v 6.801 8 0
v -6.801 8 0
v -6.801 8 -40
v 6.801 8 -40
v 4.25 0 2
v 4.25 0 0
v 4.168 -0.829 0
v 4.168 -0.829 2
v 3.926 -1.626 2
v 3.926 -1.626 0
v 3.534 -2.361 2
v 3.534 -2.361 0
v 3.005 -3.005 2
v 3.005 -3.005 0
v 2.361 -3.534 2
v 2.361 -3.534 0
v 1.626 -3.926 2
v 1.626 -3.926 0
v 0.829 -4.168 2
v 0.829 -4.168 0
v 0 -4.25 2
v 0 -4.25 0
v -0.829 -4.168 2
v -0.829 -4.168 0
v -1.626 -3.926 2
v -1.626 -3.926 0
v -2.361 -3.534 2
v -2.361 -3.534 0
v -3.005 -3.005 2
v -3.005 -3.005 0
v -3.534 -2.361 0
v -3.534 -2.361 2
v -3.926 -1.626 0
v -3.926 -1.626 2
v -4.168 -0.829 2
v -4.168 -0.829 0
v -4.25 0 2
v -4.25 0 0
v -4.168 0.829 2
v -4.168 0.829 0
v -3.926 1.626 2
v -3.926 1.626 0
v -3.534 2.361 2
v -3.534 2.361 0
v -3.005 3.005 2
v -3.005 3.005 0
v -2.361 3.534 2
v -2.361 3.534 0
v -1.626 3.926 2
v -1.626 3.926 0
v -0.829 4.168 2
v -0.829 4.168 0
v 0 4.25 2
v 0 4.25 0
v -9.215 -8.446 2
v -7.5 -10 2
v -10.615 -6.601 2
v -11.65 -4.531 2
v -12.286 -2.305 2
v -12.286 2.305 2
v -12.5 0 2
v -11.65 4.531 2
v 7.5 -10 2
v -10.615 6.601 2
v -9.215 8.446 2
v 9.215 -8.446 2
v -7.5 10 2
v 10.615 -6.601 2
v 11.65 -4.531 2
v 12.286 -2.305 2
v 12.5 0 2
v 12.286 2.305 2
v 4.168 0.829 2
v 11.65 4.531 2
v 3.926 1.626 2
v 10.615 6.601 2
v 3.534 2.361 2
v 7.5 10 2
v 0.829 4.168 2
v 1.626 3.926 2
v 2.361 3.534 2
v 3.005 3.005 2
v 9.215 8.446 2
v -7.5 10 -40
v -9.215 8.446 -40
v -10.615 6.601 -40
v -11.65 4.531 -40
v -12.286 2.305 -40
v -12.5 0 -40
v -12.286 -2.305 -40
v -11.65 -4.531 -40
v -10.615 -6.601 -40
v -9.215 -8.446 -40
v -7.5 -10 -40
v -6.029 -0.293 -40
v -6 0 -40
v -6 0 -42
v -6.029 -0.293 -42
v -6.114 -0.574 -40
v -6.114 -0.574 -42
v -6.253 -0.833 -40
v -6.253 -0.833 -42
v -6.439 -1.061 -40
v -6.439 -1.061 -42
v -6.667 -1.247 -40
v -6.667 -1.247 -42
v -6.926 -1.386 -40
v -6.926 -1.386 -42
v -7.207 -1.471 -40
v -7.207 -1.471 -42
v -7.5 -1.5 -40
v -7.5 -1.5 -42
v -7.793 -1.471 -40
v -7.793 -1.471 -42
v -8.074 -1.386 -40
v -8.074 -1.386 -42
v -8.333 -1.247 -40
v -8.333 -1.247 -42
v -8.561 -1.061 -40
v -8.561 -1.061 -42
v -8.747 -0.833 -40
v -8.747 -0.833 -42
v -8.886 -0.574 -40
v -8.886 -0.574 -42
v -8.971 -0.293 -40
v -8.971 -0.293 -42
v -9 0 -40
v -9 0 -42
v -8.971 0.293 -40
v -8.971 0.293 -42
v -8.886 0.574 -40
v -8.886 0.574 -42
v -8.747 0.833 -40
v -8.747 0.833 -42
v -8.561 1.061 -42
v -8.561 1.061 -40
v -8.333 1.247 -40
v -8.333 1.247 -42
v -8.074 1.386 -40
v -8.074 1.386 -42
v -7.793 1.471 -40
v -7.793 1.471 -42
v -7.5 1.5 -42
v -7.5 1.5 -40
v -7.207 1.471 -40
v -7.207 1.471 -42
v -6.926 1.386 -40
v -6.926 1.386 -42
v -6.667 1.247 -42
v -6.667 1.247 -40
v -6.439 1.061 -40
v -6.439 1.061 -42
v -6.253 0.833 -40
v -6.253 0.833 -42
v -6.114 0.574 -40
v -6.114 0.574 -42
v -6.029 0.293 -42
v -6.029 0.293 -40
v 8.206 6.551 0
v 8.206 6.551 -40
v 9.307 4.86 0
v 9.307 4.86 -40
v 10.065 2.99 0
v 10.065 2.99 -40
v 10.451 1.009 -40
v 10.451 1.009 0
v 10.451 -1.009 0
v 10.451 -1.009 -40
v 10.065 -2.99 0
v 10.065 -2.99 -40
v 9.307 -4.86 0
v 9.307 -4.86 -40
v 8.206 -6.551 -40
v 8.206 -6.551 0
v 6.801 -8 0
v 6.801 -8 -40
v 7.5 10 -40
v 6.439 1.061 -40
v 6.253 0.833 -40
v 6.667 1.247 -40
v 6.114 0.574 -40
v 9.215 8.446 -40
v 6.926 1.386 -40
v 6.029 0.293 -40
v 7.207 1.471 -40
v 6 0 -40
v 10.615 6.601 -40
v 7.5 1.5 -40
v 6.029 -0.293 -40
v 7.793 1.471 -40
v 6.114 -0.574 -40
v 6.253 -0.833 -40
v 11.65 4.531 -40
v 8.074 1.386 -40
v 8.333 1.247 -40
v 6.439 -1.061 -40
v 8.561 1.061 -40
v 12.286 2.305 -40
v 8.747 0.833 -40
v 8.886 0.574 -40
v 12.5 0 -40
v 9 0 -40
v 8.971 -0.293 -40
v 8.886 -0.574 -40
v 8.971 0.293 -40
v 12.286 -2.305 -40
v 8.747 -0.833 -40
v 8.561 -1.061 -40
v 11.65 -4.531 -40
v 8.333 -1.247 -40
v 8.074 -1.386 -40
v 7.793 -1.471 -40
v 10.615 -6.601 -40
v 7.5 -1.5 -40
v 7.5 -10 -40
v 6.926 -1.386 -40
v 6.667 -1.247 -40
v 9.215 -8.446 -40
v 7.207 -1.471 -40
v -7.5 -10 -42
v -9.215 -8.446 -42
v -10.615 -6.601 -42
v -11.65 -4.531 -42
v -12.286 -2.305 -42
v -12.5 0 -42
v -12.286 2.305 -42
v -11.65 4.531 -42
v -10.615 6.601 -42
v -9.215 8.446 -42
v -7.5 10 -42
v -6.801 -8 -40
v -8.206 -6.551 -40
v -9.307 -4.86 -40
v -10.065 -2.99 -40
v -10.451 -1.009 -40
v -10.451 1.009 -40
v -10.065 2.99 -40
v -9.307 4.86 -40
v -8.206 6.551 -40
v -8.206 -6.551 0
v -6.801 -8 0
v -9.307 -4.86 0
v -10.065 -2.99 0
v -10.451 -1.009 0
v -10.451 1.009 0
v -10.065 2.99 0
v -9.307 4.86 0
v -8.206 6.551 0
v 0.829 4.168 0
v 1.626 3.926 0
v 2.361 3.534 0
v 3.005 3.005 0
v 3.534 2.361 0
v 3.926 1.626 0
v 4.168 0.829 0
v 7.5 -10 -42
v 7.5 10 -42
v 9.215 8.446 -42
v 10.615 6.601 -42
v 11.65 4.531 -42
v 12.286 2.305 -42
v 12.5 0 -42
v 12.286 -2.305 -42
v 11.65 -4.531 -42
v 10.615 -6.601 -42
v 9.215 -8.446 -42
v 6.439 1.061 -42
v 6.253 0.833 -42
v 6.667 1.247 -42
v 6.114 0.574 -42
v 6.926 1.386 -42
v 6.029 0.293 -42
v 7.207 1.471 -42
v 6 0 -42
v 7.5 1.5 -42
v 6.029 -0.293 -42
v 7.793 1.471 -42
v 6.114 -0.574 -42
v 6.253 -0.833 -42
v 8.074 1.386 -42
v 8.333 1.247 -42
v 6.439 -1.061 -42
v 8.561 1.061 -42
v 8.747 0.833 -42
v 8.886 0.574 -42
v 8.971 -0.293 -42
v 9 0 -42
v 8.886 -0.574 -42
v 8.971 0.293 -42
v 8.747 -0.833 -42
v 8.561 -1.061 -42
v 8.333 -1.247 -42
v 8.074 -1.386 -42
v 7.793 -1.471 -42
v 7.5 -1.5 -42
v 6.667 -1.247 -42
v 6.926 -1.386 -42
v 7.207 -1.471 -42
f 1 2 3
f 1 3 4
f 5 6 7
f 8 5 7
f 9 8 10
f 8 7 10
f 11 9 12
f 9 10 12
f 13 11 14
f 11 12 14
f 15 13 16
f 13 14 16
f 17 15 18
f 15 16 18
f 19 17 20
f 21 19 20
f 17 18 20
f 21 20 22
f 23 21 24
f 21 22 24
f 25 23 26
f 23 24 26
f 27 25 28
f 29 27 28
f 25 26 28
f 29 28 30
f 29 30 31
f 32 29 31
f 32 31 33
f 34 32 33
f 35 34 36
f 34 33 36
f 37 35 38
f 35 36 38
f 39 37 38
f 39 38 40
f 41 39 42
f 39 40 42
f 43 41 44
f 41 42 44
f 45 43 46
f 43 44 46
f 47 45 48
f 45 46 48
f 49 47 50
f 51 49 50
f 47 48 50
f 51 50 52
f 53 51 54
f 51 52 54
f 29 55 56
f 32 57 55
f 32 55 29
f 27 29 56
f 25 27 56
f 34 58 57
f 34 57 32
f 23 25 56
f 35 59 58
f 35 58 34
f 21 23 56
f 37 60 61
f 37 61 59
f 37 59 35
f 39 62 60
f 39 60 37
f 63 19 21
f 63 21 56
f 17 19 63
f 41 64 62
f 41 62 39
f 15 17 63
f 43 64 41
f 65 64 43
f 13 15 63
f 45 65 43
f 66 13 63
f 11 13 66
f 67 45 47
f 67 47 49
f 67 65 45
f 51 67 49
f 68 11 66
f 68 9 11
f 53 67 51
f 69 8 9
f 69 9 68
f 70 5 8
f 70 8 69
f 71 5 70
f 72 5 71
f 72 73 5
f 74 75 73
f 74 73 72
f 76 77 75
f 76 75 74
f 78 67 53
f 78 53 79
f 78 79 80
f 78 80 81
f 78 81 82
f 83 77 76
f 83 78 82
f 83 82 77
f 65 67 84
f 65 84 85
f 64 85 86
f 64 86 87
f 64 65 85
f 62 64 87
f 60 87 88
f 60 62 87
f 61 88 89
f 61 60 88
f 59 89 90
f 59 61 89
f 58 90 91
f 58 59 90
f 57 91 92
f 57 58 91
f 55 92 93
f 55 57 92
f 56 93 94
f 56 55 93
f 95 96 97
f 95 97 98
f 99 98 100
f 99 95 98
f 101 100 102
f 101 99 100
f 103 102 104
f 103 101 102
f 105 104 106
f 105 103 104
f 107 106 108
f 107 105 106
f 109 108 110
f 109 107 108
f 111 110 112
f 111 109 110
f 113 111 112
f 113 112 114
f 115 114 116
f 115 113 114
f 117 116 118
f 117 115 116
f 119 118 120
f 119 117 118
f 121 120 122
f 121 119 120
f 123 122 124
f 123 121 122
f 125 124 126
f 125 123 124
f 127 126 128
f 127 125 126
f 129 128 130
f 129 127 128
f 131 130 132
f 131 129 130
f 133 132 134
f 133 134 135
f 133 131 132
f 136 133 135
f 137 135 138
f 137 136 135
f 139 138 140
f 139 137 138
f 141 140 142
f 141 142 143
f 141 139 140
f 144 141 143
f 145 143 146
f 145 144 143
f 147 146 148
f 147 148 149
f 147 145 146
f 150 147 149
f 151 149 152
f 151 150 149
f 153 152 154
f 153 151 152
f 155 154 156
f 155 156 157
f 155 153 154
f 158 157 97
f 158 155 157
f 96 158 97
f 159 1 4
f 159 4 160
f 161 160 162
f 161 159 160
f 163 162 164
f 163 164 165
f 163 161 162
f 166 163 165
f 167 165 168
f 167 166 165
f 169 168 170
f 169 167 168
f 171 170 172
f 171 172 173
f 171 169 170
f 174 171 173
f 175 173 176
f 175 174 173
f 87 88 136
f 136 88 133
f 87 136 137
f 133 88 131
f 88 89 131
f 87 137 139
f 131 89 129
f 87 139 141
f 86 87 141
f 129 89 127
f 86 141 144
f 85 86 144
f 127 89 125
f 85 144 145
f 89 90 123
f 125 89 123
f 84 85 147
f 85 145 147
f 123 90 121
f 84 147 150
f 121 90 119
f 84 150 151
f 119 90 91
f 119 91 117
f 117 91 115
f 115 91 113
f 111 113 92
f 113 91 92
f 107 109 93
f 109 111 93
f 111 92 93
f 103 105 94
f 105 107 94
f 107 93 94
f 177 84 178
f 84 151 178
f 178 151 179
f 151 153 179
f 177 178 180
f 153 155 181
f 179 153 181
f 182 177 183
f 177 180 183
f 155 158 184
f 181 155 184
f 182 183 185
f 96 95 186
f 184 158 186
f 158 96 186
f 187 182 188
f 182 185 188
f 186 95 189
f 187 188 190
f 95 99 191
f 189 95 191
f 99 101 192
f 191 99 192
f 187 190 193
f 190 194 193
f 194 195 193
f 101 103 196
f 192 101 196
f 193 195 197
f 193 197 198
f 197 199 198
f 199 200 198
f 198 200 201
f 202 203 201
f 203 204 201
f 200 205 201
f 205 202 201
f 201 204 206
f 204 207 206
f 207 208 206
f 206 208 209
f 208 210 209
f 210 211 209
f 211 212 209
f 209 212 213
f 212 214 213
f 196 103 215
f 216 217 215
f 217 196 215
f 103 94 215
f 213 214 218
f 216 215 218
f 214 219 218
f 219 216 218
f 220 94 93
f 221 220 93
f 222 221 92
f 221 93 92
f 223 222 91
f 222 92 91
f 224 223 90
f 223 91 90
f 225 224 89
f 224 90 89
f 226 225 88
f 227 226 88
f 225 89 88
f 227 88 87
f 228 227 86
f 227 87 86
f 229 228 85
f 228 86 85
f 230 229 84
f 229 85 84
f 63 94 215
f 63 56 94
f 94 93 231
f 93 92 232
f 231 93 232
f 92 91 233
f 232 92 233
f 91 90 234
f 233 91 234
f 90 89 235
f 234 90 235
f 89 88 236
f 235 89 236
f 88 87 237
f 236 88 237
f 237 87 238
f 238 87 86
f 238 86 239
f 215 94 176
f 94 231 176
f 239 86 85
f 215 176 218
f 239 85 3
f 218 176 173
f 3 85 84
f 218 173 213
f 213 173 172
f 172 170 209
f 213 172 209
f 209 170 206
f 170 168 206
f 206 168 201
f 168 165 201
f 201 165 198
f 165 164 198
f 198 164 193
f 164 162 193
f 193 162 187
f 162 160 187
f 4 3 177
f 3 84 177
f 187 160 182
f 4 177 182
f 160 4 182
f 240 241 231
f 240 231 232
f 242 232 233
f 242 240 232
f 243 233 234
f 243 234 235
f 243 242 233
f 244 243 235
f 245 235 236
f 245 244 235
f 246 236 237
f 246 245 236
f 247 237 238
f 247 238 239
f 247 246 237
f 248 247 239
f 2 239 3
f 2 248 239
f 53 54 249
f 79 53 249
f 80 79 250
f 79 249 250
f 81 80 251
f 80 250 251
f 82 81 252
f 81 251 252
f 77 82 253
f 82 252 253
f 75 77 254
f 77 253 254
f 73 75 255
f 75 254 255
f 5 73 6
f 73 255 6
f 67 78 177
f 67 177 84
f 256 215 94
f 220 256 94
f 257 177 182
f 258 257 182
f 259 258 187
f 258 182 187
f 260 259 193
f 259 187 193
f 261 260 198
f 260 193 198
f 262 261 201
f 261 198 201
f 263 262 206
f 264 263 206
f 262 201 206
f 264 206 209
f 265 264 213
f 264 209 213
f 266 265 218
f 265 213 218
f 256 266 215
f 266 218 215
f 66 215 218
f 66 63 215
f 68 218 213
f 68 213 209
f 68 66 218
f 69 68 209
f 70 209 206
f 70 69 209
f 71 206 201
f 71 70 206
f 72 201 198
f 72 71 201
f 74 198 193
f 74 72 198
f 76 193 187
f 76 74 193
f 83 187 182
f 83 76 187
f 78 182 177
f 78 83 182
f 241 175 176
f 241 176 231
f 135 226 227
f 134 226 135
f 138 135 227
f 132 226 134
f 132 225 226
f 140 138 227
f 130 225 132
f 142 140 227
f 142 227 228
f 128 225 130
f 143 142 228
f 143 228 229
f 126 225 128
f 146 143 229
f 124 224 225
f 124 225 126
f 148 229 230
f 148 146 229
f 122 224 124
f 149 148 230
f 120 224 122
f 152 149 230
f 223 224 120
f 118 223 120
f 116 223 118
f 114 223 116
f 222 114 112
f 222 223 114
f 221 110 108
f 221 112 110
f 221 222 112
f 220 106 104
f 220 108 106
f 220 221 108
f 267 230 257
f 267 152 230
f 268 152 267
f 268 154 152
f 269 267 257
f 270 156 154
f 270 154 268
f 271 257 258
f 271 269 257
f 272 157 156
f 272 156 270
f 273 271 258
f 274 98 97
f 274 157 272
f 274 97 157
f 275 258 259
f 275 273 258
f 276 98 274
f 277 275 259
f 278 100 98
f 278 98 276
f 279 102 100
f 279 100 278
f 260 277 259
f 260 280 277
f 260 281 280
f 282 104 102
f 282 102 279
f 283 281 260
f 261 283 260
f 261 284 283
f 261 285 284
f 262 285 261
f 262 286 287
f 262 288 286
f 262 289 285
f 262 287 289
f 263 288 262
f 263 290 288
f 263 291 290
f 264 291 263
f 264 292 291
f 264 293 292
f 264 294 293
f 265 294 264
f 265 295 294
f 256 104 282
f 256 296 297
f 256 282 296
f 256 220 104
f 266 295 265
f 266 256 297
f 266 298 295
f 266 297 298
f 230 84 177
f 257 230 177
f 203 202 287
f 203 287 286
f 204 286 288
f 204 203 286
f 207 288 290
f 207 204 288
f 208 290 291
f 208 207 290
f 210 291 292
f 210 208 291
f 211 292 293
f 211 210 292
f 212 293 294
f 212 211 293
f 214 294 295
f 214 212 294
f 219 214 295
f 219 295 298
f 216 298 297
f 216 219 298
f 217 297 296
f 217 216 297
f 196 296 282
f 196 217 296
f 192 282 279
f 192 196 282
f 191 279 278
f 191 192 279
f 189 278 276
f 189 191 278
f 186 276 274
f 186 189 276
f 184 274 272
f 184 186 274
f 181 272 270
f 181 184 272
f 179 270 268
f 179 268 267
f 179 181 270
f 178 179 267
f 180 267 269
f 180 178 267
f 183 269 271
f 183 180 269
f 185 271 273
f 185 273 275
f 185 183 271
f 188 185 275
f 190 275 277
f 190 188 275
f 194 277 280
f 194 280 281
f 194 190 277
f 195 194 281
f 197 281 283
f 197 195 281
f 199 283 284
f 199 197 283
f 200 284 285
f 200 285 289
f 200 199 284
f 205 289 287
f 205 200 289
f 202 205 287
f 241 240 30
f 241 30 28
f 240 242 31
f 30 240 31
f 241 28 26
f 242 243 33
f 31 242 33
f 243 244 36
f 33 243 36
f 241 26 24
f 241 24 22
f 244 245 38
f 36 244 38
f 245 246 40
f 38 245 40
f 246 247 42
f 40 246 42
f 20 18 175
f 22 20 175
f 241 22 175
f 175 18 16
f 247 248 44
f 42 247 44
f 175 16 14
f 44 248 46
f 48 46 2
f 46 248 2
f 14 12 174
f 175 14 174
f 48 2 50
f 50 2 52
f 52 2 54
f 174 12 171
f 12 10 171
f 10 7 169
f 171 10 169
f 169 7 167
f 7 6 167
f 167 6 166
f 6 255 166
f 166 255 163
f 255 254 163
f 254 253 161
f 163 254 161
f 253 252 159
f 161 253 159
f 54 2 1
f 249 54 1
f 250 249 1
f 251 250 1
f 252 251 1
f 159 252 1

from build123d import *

# Parameters (mm, degrees)
F1_DEPTH = 2
F2_DEPTH = 40
F3_R     = 1.5
F4_DEPTH = 2


with BuildPart() as f1:
    # F0 (on Top) → F1 (new body)
    with BuildSketch(Plane.XY):
        with BuildLine():
            ThreePointArc((7.5, -10), (12.5, 0), (7.5, 10))
            Line((7.5, 10), (-7.5, 10))
            ThreePointArc((-7.5, 10), (-12.5, 0), (-7.5, -10))
            Line((-7.5, -10), (7.5, -10))
        make_face()
        with BuildLine():
            Line((-6.8007352544, 8), (0, 8))
            Line((0, 8), (6.8007352544, 8))
            ThreePointArc((6.8007352544, 8), (10.5, 0), (6.8007352544, -8))
            Line((6.8007352544, -8), (-6.8007352544, -8))
            ThreePointArc((-6.8007352544, -8), (-10.5, 0), (-6.8007352544, 8))
        make_face(mode=Mode.SUBTRACT)
        with BuildLine():
            Line((6.8007352544, 8), (0, 8))
            Line((0, 8), (-6.8007352544, 8))
            ThreePointArc((-6.8007352544, 8), (-10.5, 0), (-6.8007352544, -8))
            Line((-6.8007352544, -8), (6.8007352544, -8))
            ThreePointArc((6.8007352544, -8), (10.5, 0), (6.8007352544, 8))
        make_face()
        with BuildLine():
            ThreePointArc((0, 4.25), (3.00520382, 3.00520382), (4.25, 0))
            ThreePointArc((4.25, 0), (-3.00520382, -3.00520382), (0, 4.25))
        make_face(mode=Mode.SUBTRACT)
    extrude(amount=F1_DEPTH)

    # F0 (on Top) → F2 (join)
    with BuildSketch(Plane.XY):
        with BuildLine():
            ThreePointArc((7.5, -10), (12.5, 0), (7.5, 10))
            Line((7.5, 10), (-7.5, 10))
            ThreePointArc((-7.5, 10), (-12.5, 0), (-7.5, -10))
            Line((-7.5, -10), (7.5, -10))
        make_face()
        with BuildLine():
            Line((-6.8007352544, 8), (0, 8))
            Line((0, 8), (6.8007352544, 8))
            ThreePointArc((6.8007352544, 8), (10.5, 0), (6.8007352544, -8))
            Line((6.8007352544, -8), (-6.8007352544, -8))
            ThreePointArc((-6.8007352544, -8), (-10.5, 0), (-6.8007352544, 8))
        make_face(mode=Mode.SUBTRACT)
    extrude(amount=-F2_DEPTH)


with BuildPart() as f4:
    # F3 (on face) → F4 (new body)
    with BuildSketch(Plane(origin=(0, 0, -40), x_dir=(1, 0, 0), z_dir=(0, 0, -1))):
        with BuildLine():
            ThreePointArc((7.5, -10), (12.5, 0), (7.5, 10))
            Line((7.5, 10), (-7.5, 10))
            ThreePointArc((-7.5, 10), (-12.5, 0), (-7.5, -10))
            Line((-7.5, -10), (7.5, -10))
        make_face()
        with BuildLine():
            ThreePointArc((6.8007352544, 8), (10.5, 0), (6.8007352544, -8))
            Line((6.8007352544, -8), (-6.8007352544, -8))
            ThreePointArc((-6.8007352544, -8), (-10.5, 0), (-6.8007352544, 8))
            Line((-6.8007352544, 8), (6.8007352544, 8))
        make_face(mode=Mode.SUBTRACT)
        with BuildLine():
            Line((-6.8007352544, -8), (6.8007352544, -8))
            ThreePointArc((6.8007352544, -8), (10.5, 0), (6.8007352544, 8))
            Line((6.8007352544, 8), (-6.8007352544, 8))
            ThreePointArc((-6.8007352544, 8), (-10.5, 0), (-6.8007352544, -8))
        make_face()
        with Locations((-7.5, 0)):
            Circle(F3_R, mode=Mode.SUBTRACT)
        with Locations((7.5, 0)):
            Circle(F3_R, mode=Mode.SUBTRACT)
    extrude(amount=F4_DEPTH)


solid = Compound([f1.part, f4.part])
